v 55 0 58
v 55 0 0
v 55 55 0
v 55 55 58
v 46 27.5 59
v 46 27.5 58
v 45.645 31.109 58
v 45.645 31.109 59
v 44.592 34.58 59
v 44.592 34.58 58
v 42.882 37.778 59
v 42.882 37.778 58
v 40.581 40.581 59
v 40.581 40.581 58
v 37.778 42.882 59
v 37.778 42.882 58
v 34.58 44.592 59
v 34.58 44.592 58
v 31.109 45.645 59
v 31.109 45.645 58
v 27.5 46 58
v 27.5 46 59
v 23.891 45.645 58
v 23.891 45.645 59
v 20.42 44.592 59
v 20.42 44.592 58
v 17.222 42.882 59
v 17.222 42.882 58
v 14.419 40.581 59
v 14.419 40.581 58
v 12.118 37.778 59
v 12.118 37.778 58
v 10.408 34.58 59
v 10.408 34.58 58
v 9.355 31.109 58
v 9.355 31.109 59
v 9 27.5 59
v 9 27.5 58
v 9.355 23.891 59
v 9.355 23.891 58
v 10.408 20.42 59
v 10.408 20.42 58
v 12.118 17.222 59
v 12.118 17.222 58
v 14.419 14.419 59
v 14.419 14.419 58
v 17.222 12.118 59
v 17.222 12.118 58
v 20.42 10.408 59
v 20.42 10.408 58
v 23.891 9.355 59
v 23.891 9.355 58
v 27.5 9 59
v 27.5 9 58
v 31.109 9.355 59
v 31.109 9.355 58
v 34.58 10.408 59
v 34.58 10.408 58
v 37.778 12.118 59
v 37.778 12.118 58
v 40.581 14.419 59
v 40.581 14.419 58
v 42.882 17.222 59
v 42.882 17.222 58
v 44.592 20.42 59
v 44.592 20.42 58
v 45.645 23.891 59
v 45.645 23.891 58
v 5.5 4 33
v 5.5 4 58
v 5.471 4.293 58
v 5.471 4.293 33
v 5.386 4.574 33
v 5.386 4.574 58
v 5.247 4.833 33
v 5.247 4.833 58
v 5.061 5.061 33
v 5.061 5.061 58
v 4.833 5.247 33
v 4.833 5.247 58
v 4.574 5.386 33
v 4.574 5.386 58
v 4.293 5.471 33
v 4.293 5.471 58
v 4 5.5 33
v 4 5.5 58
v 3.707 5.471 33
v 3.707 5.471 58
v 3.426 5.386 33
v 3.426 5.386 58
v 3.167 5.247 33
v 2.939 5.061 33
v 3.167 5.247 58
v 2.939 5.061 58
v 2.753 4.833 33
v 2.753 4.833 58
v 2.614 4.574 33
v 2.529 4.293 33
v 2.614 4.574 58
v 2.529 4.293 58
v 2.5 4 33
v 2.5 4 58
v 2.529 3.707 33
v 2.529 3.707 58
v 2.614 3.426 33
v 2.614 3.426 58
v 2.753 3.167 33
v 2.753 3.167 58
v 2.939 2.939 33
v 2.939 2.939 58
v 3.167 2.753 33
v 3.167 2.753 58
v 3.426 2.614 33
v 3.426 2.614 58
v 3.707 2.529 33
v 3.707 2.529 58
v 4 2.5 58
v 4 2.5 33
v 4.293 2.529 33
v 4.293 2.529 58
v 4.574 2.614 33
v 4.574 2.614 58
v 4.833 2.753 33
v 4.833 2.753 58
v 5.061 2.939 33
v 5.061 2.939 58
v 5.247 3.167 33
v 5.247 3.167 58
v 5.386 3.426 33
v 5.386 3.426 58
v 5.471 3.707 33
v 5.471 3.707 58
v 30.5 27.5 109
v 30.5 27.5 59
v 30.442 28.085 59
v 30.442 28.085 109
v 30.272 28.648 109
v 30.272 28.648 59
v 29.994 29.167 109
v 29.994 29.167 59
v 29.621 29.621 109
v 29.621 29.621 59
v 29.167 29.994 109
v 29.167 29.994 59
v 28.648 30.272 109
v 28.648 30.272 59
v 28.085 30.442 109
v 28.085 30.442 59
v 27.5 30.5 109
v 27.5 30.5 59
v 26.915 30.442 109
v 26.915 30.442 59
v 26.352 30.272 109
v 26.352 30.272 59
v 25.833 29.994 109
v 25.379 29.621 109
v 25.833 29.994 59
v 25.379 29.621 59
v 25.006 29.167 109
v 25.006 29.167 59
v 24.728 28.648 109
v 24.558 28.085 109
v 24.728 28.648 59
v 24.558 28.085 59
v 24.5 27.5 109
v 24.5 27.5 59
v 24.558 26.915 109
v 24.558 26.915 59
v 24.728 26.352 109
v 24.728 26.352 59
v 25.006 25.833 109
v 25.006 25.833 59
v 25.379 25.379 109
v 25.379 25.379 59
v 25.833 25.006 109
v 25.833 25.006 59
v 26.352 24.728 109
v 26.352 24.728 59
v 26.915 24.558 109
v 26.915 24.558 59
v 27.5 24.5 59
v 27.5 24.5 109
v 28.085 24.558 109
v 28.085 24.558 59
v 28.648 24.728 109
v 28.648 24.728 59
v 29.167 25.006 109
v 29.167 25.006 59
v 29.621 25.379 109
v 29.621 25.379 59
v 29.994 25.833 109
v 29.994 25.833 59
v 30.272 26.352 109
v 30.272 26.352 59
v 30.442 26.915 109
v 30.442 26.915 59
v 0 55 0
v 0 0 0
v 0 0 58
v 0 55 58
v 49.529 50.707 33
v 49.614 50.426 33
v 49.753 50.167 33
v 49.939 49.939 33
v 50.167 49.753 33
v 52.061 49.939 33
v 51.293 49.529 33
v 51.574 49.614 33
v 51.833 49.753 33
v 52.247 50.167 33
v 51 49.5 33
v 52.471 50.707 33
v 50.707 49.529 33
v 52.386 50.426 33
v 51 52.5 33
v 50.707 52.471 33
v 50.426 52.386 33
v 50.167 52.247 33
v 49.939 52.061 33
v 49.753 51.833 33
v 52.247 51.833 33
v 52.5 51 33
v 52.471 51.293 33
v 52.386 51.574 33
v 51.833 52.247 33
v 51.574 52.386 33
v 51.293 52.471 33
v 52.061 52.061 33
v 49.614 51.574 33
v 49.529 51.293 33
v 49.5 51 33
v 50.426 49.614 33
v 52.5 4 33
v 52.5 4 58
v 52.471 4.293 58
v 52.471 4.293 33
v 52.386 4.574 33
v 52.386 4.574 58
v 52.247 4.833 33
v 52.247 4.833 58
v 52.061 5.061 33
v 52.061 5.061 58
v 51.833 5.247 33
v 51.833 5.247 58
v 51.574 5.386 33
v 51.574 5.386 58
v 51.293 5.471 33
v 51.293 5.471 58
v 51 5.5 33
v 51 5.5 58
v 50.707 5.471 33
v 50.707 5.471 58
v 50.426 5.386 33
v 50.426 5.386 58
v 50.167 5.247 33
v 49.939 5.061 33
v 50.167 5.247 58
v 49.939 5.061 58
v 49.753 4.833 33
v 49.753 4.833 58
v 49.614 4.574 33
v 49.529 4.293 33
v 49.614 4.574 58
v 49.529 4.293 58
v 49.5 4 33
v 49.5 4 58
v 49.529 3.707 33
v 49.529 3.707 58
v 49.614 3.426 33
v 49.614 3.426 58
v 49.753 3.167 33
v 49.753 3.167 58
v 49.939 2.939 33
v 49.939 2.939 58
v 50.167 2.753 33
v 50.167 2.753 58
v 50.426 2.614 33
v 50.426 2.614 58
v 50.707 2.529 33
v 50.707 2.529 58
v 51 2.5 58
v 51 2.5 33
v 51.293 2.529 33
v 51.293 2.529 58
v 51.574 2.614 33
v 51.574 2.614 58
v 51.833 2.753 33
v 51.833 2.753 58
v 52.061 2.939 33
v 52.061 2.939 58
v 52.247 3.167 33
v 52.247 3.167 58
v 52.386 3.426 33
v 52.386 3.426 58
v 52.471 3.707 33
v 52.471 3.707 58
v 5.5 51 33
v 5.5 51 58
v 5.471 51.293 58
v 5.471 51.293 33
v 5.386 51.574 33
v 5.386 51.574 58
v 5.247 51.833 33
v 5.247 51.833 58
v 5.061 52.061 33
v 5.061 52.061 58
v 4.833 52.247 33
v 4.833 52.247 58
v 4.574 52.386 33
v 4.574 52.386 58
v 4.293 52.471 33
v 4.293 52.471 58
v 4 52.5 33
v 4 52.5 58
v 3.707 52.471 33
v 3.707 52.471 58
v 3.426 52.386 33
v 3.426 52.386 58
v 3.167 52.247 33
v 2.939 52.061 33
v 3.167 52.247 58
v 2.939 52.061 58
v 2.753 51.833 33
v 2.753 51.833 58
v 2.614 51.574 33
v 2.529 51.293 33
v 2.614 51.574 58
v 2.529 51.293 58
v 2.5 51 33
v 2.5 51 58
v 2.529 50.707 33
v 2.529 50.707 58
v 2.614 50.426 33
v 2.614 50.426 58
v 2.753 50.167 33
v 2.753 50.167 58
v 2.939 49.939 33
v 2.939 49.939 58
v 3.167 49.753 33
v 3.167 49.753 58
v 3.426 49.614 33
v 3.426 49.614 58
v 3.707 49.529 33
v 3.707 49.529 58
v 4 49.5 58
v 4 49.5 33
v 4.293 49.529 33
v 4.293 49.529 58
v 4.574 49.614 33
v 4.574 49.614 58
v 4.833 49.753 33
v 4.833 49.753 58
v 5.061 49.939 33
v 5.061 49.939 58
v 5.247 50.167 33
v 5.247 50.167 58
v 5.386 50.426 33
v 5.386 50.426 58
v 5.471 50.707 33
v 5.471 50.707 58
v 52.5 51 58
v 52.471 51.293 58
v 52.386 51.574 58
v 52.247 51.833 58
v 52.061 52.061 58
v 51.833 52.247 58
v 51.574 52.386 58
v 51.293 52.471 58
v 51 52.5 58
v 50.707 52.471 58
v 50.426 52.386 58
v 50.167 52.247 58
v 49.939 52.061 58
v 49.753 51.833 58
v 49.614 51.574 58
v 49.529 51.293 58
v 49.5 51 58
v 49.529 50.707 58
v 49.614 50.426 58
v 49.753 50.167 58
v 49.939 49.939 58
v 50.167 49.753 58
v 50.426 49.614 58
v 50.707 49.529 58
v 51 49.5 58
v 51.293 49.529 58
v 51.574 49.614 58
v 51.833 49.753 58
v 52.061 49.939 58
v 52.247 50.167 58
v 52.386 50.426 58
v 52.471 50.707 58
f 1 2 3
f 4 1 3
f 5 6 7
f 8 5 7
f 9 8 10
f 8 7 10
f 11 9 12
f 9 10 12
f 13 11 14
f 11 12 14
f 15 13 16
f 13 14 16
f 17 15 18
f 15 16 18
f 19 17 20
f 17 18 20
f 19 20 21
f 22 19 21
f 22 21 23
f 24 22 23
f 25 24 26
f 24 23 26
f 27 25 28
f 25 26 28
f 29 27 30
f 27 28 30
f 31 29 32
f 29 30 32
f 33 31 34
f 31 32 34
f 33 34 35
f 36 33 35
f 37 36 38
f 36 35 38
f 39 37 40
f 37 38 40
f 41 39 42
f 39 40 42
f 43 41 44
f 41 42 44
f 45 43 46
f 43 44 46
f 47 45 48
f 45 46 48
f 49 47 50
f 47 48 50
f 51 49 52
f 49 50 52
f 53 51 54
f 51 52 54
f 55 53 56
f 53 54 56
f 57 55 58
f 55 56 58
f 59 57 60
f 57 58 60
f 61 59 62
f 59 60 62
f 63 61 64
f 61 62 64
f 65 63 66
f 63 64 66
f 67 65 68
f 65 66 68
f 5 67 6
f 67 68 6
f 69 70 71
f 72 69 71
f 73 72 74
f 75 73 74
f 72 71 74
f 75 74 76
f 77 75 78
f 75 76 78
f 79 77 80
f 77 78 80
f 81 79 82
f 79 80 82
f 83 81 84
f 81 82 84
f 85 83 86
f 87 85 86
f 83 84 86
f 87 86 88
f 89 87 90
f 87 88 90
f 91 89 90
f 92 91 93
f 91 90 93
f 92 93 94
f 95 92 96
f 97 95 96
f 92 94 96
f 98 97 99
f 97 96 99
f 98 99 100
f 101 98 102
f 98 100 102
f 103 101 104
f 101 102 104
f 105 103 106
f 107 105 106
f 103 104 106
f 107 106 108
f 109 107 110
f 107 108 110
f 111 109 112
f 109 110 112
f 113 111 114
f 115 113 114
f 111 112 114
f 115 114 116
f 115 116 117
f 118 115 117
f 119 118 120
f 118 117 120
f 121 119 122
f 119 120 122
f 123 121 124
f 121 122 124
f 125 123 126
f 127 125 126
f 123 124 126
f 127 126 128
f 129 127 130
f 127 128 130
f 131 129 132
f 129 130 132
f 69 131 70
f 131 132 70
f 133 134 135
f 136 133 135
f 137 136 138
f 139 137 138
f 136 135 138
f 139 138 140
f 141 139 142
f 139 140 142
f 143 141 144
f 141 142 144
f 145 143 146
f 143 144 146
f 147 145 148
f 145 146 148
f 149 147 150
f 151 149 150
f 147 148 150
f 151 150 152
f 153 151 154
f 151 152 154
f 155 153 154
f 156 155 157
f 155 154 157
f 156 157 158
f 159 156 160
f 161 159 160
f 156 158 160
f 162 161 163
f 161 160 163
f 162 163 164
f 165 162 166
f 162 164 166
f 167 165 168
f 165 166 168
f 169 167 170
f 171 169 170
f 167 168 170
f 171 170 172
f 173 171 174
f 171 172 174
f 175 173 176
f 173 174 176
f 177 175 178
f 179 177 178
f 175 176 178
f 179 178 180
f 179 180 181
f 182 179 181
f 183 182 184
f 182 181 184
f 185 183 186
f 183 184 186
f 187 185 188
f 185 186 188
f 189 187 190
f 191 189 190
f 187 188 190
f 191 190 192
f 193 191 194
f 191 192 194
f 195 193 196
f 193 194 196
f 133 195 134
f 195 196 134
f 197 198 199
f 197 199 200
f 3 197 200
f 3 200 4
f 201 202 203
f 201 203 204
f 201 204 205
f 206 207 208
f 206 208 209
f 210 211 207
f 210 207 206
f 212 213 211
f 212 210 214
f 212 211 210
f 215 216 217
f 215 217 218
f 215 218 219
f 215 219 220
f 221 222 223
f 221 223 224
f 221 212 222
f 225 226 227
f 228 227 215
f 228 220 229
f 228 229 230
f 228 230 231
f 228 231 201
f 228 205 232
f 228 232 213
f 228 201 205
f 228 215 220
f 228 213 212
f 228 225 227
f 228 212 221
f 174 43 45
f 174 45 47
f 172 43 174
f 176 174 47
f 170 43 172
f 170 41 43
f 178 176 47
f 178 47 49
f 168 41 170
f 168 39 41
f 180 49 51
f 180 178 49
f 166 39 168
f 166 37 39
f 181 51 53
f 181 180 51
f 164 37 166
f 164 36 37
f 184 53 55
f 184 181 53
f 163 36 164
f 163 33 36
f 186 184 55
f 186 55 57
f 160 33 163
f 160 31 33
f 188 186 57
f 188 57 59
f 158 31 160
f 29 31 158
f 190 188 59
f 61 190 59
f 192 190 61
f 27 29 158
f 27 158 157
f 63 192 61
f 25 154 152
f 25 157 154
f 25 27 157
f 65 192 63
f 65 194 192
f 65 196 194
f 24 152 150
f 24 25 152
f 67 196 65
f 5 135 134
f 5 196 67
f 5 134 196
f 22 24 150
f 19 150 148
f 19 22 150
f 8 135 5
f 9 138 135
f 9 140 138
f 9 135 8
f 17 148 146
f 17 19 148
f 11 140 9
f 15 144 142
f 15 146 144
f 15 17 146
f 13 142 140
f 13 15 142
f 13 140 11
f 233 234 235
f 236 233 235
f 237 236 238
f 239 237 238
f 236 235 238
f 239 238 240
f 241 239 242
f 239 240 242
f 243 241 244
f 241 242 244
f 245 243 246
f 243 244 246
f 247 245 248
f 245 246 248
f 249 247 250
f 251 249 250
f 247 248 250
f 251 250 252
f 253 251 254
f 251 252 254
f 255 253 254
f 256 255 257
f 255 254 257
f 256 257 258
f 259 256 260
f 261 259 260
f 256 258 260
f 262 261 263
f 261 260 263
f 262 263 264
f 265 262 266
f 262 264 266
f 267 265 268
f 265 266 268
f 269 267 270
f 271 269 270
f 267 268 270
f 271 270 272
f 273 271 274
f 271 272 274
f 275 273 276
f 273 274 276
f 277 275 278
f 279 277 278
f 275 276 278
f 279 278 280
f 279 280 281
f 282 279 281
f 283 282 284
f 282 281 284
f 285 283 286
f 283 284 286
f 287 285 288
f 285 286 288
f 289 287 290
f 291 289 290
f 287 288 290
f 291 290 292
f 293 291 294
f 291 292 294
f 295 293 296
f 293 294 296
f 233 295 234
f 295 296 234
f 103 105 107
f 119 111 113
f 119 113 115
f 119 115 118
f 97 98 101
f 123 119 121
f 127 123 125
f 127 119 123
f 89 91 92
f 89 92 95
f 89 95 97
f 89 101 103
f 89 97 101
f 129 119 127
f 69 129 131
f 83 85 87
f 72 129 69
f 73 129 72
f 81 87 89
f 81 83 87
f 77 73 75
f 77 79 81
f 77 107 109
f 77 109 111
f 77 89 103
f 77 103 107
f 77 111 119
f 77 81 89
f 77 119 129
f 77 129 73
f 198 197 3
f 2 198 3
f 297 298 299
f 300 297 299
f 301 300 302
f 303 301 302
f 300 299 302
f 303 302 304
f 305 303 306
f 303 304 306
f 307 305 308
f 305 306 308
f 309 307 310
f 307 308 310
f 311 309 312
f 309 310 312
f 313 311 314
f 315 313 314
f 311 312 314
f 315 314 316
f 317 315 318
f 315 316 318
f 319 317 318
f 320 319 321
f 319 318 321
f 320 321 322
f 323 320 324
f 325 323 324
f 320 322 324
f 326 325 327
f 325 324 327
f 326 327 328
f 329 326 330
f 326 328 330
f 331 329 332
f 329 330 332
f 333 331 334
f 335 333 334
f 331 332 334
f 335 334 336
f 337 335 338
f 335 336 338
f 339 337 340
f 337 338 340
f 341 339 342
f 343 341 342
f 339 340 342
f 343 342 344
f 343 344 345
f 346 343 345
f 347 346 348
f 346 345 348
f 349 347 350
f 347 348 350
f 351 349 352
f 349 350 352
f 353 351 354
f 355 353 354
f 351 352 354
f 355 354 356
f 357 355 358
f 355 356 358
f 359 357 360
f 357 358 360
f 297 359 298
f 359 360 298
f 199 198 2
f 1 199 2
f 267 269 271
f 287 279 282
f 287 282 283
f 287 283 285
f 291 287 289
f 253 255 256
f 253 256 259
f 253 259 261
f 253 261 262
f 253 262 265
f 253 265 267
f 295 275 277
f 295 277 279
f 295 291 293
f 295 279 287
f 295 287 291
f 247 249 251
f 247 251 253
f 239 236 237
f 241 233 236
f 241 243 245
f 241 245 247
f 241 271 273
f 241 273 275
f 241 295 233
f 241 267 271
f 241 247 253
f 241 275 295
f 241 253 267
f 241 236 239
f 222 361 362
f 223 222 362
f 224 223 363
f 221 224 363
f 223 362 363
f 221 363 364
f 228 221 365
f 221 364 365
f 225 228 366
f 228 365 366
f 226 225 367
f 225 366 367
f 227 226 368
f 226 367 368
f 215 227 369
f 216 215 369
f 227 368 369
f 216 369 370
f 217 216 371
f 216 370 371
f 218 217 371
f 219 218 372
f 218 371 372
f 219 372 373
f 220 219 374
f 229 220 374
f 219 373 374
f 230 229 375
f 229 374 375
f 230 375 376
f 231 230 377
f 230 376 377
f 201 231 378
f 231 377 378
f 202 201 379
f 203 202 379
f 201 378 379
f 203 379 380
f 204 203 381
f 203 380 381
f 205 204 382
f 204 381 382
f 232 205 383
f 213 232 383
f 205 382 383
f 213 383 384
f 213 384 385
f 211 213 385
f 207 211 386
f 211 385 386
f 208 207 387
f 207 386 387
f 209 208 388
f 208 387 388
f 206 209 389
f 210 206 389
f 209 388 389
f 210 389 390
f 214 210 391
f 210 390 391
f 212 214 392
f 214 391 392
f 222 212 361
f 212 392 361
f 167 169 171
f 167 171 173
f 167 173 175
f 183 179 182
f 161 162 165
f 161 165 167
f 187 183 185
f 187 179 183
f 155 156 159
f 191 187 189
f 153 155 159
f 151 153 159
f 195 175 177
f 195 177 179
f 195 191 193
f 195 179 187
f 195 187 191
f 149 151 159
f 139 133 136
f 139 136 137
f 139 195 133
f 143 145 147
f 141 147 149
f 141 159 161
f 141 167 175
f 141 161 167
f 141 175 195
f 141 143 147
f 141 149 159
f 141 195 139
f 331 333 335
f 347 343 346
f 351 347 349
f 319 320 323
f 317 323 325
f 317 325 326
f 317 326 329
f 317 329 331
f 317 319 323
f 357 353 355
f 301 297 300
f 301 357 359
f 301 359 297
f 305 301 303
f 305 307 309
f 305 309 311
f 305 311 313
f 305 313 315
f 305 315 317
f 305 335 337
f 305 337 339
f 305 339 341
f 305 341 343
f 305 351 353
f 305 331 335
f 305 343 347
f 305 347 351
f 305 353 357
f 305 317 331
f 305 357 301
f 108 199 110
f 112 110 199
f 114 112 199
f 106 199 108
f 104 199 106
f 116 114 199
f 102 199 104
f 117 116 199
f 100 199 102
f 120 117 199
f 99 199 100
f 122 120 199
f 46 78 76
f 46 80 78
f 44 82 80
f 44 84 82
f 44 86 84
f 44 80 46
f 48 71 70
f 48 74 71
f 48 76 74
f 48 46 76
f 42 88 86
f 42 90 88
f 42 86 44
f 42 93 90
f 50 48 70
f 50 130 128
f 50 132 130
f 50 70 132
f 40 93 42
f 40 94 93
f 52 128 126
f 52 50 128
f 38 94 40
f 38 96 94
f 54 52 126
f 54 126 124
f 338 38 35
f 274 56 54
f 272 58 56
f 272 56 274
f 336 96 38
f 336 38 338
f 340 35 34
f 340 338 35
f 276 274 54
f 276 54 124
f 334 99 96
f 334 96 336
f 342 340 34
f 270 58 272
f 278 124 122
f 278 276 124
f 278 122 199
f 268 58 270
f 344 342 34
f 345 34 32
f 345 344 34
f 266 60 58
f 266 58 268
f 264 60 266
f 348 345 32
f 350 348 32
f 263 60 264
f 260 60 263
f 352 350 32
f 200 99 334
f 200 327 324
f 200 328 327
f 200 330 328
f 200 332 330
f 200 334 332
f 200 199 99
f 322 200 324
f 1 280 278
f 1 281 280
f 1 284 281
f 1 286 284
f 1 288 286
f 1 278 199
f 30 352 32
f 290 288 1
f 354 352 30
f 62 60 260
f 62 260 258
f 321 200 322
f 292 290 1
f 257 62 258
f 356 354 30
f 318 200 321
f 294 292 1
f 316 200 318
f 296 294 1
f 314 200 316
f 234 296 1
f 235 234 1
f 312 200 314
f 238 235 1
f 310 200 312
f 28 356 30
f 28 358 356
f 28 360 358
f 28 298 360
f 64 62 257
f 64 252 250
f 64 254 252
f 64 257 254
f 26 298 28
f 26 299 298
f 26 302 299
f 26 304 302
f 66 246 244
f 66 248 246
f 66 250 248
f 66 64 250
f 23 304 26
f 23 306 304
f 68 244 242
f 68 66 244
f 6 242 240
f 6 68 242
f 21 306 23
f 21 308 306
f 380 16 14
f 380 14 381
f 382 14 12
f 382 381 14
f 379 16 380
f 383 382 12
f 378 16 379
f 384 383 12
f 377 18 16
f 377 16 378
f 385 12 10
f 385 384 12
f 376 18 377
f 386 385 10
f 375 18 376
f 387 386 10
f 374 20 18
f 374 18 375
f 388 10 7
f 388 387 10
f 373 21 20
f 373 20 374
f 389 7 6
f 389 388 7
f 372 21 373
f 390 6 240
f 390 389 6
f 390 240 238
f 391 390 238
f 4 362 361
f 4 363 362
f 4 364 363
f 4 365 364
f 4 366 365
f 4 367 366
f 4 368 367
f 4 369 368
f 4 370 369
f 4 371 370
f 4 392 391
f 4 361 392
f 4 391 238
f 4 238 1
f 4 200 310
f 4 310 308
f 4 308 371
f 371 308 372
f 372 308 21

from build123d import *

# Parameters (mm, degrees)
F0_W     = 55
F0_H     = 55
F1_DEPTH = 58
F2_R     = 18.5
F3_DEPTH = 1
F4_R     = 3
F5_DEPTH = 50
F6_R     = 1.5
F7_DEPTH = 25


with BuildPart() as f1:
    # F0 (on Top) → F1 (new body)
    with BuildSketch(Plane.XY):
        with Locations((27.5, 27.5)):
            Rectangle(F0_W, F0_H)
    extrude(amount=F1_DEPTH)

    # F2 (on face) → F3 (join)
    with BuildSketch(Plane.XY.offset(58)):
        with Locations((27.5, 27.5)):
            Circle(F2_R)
    extrude(amount=F3_DEPTH)

    # F4 (on face) → F5 (join)
    with BuildSketch(Plane.XY.offset(59)):
        with Locations((27.5, 27.5)):
            Circle(F4_R)
    extrude(amount=F5_DEPTH)

    # F6 (on face) → F7 (cut)
    with BuildSketch(Plane.XY.offset(58)):
        with Locations((4, 51)):
            Circle(F6_R)
        with Locations((4, 4)):
            Circle(F6_R)
        with Locations((51, 4)):
            Circle(F6_R)
        with Locations((51, 51)):
            Circle(F6_R)
    extrude(amount=-F7_DEPTH, mode=Mode.SUBTRACT)


solid = f1.part
